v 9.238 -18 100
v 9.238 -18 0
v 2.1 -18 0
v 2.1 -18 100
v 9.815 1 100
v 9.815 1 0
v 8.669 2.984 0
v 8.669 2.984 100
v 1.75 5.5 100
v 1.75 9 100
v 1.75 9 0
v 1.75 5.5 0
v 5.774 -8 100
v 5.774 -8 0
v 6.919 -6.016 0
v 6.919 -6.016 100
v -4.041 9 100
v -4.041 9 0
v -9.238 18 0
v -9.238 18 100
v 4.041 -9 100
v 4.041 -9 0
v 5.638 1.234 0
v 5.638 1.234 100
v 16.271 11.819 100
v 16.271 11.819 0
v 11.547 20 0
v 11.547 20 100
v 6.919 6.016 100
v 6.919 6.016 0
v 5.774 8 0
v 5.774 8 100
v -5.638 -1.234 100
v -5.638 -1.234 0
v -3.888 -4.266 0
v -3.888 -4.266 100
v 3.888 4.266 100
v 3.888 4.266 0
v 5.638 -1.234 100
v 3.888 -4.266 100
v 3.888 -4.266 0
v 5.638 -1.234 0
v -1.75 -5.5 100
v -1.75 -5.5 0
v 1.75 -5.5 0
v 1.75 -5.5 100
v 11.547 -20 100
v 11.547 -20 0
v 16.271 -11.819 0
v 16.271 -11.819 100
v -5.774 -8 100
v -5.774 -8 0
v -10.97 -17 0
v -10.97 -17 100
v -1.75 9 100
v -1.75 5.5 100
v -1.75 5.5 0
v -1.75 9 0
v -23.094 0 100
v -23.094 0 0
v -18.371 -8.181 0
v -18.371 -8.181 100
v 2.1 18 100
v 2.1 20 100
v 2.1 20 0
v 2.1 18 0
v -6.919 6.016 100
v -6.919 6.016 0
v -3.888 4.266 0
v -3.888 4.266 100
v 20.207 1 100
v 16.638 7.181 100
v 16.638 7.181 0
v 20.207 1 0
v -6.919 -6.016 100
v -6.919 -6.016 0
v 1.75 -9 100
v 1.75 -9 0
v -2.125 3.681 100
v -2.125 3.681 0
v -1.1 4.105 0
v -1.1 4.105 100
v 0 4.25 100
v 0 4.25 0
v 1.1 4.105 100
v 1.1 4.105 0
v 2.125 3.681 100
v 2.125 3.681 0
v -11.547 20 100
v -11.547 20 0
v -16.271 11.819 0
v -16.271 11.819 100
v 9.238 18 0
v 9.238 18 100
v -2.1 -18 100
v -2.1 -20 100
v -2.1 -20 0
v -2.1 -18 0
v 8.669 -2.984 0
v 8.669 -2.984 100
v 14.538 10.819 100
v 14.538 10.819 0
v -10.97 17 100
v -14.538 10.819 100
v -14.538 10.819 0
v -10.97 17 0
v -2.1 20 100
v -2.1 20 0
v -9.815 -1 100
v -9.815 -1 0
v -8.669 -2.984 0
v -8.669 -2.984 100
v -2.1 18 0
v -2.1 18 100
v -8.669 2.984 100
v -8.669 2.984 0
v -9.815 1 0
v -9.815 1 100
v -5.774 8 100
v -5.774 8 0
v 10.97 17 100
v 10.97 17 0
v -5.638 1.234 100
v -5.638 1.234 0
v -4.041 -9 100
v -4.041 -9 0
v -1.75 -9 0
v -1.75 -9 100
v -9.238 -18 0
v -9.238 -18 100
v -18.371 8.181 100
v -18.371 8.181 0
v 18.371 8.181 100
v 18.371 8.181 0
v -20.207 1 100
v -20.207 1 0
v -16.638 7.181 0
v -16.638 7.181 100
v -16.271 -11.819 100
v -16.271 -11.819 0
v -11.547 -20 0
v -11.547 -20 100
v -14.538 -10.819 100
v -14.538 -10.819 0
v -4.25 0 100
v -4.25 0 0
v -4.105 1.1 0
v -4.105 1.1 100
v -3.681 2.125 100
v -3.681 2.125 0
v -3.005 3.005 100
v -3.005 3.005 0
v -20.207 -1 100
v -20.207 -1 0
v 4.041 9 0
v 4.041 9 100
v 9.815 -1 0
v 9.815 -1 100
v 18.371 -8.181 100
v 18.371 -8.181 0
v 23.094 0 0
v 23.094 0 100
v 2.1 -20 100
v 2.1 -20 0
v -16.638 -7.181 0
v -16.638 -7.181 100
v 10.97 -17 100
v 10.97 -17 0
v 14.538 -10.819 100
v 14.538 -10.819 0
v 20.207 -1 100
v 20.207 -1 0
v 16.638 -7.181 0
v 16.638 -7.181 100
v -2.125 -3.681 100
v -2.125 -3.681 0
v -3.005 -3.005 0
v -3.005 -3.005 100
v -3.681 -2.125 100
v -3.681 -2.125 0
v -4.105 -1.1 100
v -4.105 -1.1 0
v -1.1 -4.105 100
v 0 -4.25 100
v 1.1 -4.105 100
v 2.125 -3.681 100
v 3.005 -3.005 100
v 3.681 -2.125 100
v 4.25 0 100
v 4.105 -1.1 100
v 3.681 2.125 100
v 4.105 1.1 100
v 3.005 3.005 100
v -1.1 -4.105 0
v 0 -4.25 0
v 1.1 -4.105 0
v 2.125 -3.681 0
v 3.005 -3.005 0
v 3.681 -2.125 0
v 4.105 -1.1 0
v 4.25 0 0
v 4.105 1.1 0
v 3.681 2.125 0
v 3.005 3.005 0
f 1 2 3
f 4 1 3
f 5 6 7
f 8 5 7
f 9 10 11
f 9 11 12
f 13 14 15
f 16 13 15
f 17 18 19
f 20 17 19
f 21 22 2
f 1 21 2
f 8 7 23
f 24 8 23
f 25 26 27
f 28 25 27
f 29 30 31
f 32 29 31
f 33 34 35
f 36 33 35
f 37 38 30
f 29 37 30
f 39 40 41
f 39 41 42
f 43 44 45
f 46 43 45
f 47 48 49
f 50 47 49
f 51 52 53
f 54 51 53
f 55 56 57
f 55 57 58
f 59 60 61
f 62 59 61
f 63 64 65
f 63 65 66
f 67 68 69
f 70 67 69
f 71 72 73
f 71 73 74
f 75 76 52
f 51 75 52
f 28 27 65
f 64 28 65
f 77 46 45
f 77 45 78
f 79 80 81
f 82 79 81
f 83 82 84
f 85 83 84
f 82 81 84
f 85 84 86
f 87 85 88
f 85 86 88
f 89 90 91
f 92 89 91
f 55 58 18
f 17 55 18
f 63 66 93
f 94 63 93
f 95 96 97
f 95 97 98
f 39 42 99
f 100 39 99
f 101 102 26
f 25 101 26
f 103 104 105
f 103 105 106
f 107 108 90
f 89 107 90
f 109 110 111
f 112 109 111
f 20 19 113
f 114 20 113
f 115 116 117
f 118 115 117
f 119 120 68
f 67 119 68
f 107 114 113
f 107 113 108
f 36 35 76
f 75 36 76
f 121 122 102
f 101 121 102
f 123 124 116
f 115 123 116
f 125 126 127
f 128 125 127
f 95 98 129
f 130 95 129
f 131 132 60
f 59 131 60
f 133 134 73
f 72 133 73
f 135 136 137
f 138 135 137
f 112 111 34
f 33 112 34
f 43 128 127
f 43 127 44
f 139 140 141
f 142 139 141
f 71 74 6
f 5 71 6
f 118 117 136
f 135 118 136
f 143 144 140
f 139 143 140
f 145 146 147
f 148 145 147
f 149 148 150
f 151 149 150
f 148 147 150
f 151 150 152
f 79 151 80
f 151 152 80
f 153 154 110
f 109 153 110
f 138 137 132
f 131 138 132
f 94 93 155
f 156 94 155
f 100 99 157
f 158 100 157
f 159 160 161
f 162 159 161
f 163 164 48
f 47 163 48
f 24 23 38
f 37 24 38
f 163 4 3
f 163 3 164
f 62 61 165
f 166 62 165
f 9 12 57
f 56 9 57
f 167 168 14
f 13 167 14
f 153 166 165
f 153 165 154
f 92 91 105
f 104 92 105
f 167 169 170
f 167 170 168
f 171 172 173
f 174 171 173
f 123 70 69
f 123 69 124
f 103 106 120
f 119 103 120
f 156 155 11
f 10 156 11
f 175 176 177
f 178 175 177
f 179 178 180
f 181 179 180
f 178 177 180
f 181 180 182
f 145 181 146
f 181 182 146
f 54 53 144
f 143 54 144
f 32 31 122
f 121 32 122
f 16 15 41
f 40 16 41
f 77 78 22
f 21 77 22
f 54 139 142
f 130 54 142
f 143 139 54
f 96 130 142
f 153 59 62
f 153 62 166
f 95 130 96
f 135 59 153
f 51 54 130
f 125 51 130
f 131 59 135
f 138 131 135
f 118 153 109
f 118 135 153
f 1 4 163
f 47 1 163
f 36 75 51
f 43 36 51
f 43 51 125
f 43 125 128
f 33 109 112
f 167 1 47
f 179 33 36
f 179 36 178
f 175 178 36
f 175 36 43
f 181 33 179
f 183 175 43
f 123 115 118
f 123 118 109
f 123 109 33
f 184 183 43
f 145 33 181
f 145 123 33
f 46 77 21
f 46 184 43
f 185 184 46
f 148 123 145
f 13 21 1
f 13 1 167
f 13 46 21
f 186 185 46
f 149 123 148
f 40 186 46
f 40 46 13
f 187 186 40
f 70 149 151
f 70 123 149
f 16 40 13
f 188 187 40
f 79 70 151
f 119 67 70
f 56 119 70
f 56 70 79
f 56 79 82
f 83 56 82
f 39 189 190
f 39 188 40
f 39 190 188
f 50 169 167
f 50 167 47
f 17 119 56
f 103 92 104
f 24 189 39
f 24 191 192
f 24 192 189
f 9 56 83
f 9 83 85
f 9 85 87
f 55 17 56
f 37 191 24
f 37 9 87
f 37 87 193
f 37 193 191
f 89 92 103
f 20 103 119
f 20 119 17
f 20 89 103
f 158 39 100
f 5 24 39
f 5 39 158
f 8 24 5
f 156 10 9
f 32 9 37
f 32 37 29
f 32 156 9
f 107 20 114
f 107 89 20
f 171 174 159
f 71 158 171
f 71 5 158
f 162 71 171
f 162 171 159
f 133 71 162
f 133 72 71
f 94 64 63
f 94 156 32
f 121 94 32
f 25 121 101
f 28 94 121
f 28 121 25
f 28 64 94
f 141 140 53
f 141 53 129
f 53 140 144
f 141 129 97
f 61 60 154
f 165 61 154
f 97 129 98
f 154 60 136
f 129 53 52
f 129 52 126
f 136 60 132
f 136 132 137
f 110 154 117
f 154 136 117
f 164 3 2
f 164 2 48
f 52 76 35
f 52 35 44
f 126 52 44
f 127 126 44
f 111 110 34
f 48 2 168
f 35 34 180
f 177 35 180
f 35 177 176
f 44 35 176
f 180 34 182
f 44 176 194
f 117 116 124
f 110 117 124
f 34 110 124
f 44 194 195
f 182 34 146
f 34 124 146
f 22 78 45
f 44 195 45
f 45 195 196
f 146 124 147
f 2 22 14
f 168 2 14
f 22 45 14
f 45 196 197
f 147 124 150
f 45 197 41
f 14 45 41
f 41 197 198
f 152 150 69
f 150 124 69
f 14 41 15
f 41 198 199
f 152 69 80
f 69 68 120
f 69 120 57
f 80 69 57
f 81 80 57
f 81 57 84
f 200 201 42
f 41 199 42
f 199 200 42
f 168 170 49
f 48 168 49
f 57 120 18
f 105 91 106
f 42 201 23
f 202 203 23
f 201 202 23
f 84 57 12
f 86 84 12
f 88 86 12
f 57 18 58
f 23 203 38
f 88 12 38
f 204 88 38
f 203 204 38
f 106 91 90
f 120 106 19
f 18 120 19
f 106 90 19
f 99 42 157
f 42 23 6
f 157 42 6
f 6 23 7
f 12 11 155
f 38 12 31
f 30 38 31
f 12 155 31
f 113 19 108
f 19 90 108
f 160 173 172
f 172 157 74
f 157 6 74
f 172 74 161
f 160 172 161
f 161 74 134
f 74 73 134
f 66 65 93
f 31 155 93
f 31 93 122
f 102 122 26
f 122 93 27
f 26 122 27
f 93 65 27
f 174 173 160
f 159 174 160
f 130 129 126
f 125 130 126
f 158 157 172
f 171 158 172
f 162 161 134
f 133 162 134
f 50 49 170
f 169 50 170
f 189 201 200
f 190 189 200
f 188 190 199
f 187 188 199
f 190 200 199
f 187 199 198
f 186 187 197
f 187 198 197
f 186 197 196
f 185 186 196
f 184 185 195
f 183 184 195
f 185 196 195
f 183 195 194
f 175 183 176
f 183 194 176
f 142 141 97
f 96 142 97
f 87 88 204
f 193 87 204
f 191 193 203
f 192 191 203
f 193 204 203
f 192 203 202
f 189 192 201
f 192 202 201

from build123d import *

# Parameters (mm, degrees)
F1_DEPTH = 100


with BuildPart() as f1:
    # F0 (on Top) → F1 (new body)
    with BuildSketch(Plane.XY):
        Polygon((16.270508, 11.818653), (11.547005, 20), (2.1, 20), (2.1, 18), (9.237604, 18), (4.041452, 9), (1.75, 9), (1.75, 5.5), (-1.75, 5.5), (-1.75, 9), (-4.041452, 9), (-9.237604, 18), (-2.1, 18), (-2.1, 20), (-11.547005, 20), (-16.270508, 11.818653), (-14.538457, 10.818653), (-10.969655, 17), (-5.773503, 8), (-6.919229, 6.015544), (-3.88814, 4.265544), (-5.63814, 1.234456), (-8.669229, 2.984456), (-9.814955, 1), (-20.207259, 1), (-16.638457, 7.181347), (-18.370508, 8.181347), (-23.094011, 0), (-18.370508, -8.181347), (-16.638457, -7.181347), (-20.207259, -1), (-9.814955, -1), (-8.669229, -2.984456), (-5.63814, -1.234456), (-3.88814, -4.265544), (-6.919229, -6.015544), (-5.773503, -8), (-10.969655, -17), (-14.538457, -10.818653), (-16.270508, -11.818653), (-11.547005, -20), (-2.1, -20), (-2.1, -18), (-9.237604, -18), (-4.041452, -9), (-1.75, -9), (-1.75, -5.5), (1.75, -5.5), (1.75, -9), (4.041452, -9), (9.237604, -18), (2.1, -18), (2.1, -20), (11.547005, -20), (16.270508, -11.818653), (14.538457, -10.818653), (10.969655, -17), (5.773503, -8), (6.919229, -6.015544), (3.88814, -4.265544), (5.63814, -1.234456), (8.669229, -2.984456), (9.814955, -1), (20.207259, -1), (16.638457, -7.181347), (18.370508, -8.181347), (23.094011, 0), (18.370508, 8.181347), (16.638457, 7.181347), (20.207259, 1), (9.814955, 1), (8.669229, 2.984456), (5.63814, 1.234456), (3.88814, 4.265544), (6.919229, 6.015544), (5.773503, 8), (10.969655, 17), (14.538457, 10.818653), align=None)
        with BuildLine():
            ThreePointArc((-2.125, 3.680608), (0, 4.25), (2.125, 3.680608))
            ThreePointArc((2.125, 3.680608), (3.680608, 2.125), (4.25, 0))
            ThreePointArc((4.25, 0), (3.680608, -2.125), (2.125, -3.680608))
            ThreePointArc((2.125, -3.680608), (0, -4.25), (-2.125, -3.680608))
            ThreePointArc((-2.125, -3.680608), (-3.680608, -2.125), (-4.25, 0))
            ThreePointArc((-4.25, 0), (-3.680608, 2.125), (-2.125, 3.680608))
        make_face(mode=Mode.SUBTRACT)
    extrude(amount=F1_DEPTH)


solid = f1.part
